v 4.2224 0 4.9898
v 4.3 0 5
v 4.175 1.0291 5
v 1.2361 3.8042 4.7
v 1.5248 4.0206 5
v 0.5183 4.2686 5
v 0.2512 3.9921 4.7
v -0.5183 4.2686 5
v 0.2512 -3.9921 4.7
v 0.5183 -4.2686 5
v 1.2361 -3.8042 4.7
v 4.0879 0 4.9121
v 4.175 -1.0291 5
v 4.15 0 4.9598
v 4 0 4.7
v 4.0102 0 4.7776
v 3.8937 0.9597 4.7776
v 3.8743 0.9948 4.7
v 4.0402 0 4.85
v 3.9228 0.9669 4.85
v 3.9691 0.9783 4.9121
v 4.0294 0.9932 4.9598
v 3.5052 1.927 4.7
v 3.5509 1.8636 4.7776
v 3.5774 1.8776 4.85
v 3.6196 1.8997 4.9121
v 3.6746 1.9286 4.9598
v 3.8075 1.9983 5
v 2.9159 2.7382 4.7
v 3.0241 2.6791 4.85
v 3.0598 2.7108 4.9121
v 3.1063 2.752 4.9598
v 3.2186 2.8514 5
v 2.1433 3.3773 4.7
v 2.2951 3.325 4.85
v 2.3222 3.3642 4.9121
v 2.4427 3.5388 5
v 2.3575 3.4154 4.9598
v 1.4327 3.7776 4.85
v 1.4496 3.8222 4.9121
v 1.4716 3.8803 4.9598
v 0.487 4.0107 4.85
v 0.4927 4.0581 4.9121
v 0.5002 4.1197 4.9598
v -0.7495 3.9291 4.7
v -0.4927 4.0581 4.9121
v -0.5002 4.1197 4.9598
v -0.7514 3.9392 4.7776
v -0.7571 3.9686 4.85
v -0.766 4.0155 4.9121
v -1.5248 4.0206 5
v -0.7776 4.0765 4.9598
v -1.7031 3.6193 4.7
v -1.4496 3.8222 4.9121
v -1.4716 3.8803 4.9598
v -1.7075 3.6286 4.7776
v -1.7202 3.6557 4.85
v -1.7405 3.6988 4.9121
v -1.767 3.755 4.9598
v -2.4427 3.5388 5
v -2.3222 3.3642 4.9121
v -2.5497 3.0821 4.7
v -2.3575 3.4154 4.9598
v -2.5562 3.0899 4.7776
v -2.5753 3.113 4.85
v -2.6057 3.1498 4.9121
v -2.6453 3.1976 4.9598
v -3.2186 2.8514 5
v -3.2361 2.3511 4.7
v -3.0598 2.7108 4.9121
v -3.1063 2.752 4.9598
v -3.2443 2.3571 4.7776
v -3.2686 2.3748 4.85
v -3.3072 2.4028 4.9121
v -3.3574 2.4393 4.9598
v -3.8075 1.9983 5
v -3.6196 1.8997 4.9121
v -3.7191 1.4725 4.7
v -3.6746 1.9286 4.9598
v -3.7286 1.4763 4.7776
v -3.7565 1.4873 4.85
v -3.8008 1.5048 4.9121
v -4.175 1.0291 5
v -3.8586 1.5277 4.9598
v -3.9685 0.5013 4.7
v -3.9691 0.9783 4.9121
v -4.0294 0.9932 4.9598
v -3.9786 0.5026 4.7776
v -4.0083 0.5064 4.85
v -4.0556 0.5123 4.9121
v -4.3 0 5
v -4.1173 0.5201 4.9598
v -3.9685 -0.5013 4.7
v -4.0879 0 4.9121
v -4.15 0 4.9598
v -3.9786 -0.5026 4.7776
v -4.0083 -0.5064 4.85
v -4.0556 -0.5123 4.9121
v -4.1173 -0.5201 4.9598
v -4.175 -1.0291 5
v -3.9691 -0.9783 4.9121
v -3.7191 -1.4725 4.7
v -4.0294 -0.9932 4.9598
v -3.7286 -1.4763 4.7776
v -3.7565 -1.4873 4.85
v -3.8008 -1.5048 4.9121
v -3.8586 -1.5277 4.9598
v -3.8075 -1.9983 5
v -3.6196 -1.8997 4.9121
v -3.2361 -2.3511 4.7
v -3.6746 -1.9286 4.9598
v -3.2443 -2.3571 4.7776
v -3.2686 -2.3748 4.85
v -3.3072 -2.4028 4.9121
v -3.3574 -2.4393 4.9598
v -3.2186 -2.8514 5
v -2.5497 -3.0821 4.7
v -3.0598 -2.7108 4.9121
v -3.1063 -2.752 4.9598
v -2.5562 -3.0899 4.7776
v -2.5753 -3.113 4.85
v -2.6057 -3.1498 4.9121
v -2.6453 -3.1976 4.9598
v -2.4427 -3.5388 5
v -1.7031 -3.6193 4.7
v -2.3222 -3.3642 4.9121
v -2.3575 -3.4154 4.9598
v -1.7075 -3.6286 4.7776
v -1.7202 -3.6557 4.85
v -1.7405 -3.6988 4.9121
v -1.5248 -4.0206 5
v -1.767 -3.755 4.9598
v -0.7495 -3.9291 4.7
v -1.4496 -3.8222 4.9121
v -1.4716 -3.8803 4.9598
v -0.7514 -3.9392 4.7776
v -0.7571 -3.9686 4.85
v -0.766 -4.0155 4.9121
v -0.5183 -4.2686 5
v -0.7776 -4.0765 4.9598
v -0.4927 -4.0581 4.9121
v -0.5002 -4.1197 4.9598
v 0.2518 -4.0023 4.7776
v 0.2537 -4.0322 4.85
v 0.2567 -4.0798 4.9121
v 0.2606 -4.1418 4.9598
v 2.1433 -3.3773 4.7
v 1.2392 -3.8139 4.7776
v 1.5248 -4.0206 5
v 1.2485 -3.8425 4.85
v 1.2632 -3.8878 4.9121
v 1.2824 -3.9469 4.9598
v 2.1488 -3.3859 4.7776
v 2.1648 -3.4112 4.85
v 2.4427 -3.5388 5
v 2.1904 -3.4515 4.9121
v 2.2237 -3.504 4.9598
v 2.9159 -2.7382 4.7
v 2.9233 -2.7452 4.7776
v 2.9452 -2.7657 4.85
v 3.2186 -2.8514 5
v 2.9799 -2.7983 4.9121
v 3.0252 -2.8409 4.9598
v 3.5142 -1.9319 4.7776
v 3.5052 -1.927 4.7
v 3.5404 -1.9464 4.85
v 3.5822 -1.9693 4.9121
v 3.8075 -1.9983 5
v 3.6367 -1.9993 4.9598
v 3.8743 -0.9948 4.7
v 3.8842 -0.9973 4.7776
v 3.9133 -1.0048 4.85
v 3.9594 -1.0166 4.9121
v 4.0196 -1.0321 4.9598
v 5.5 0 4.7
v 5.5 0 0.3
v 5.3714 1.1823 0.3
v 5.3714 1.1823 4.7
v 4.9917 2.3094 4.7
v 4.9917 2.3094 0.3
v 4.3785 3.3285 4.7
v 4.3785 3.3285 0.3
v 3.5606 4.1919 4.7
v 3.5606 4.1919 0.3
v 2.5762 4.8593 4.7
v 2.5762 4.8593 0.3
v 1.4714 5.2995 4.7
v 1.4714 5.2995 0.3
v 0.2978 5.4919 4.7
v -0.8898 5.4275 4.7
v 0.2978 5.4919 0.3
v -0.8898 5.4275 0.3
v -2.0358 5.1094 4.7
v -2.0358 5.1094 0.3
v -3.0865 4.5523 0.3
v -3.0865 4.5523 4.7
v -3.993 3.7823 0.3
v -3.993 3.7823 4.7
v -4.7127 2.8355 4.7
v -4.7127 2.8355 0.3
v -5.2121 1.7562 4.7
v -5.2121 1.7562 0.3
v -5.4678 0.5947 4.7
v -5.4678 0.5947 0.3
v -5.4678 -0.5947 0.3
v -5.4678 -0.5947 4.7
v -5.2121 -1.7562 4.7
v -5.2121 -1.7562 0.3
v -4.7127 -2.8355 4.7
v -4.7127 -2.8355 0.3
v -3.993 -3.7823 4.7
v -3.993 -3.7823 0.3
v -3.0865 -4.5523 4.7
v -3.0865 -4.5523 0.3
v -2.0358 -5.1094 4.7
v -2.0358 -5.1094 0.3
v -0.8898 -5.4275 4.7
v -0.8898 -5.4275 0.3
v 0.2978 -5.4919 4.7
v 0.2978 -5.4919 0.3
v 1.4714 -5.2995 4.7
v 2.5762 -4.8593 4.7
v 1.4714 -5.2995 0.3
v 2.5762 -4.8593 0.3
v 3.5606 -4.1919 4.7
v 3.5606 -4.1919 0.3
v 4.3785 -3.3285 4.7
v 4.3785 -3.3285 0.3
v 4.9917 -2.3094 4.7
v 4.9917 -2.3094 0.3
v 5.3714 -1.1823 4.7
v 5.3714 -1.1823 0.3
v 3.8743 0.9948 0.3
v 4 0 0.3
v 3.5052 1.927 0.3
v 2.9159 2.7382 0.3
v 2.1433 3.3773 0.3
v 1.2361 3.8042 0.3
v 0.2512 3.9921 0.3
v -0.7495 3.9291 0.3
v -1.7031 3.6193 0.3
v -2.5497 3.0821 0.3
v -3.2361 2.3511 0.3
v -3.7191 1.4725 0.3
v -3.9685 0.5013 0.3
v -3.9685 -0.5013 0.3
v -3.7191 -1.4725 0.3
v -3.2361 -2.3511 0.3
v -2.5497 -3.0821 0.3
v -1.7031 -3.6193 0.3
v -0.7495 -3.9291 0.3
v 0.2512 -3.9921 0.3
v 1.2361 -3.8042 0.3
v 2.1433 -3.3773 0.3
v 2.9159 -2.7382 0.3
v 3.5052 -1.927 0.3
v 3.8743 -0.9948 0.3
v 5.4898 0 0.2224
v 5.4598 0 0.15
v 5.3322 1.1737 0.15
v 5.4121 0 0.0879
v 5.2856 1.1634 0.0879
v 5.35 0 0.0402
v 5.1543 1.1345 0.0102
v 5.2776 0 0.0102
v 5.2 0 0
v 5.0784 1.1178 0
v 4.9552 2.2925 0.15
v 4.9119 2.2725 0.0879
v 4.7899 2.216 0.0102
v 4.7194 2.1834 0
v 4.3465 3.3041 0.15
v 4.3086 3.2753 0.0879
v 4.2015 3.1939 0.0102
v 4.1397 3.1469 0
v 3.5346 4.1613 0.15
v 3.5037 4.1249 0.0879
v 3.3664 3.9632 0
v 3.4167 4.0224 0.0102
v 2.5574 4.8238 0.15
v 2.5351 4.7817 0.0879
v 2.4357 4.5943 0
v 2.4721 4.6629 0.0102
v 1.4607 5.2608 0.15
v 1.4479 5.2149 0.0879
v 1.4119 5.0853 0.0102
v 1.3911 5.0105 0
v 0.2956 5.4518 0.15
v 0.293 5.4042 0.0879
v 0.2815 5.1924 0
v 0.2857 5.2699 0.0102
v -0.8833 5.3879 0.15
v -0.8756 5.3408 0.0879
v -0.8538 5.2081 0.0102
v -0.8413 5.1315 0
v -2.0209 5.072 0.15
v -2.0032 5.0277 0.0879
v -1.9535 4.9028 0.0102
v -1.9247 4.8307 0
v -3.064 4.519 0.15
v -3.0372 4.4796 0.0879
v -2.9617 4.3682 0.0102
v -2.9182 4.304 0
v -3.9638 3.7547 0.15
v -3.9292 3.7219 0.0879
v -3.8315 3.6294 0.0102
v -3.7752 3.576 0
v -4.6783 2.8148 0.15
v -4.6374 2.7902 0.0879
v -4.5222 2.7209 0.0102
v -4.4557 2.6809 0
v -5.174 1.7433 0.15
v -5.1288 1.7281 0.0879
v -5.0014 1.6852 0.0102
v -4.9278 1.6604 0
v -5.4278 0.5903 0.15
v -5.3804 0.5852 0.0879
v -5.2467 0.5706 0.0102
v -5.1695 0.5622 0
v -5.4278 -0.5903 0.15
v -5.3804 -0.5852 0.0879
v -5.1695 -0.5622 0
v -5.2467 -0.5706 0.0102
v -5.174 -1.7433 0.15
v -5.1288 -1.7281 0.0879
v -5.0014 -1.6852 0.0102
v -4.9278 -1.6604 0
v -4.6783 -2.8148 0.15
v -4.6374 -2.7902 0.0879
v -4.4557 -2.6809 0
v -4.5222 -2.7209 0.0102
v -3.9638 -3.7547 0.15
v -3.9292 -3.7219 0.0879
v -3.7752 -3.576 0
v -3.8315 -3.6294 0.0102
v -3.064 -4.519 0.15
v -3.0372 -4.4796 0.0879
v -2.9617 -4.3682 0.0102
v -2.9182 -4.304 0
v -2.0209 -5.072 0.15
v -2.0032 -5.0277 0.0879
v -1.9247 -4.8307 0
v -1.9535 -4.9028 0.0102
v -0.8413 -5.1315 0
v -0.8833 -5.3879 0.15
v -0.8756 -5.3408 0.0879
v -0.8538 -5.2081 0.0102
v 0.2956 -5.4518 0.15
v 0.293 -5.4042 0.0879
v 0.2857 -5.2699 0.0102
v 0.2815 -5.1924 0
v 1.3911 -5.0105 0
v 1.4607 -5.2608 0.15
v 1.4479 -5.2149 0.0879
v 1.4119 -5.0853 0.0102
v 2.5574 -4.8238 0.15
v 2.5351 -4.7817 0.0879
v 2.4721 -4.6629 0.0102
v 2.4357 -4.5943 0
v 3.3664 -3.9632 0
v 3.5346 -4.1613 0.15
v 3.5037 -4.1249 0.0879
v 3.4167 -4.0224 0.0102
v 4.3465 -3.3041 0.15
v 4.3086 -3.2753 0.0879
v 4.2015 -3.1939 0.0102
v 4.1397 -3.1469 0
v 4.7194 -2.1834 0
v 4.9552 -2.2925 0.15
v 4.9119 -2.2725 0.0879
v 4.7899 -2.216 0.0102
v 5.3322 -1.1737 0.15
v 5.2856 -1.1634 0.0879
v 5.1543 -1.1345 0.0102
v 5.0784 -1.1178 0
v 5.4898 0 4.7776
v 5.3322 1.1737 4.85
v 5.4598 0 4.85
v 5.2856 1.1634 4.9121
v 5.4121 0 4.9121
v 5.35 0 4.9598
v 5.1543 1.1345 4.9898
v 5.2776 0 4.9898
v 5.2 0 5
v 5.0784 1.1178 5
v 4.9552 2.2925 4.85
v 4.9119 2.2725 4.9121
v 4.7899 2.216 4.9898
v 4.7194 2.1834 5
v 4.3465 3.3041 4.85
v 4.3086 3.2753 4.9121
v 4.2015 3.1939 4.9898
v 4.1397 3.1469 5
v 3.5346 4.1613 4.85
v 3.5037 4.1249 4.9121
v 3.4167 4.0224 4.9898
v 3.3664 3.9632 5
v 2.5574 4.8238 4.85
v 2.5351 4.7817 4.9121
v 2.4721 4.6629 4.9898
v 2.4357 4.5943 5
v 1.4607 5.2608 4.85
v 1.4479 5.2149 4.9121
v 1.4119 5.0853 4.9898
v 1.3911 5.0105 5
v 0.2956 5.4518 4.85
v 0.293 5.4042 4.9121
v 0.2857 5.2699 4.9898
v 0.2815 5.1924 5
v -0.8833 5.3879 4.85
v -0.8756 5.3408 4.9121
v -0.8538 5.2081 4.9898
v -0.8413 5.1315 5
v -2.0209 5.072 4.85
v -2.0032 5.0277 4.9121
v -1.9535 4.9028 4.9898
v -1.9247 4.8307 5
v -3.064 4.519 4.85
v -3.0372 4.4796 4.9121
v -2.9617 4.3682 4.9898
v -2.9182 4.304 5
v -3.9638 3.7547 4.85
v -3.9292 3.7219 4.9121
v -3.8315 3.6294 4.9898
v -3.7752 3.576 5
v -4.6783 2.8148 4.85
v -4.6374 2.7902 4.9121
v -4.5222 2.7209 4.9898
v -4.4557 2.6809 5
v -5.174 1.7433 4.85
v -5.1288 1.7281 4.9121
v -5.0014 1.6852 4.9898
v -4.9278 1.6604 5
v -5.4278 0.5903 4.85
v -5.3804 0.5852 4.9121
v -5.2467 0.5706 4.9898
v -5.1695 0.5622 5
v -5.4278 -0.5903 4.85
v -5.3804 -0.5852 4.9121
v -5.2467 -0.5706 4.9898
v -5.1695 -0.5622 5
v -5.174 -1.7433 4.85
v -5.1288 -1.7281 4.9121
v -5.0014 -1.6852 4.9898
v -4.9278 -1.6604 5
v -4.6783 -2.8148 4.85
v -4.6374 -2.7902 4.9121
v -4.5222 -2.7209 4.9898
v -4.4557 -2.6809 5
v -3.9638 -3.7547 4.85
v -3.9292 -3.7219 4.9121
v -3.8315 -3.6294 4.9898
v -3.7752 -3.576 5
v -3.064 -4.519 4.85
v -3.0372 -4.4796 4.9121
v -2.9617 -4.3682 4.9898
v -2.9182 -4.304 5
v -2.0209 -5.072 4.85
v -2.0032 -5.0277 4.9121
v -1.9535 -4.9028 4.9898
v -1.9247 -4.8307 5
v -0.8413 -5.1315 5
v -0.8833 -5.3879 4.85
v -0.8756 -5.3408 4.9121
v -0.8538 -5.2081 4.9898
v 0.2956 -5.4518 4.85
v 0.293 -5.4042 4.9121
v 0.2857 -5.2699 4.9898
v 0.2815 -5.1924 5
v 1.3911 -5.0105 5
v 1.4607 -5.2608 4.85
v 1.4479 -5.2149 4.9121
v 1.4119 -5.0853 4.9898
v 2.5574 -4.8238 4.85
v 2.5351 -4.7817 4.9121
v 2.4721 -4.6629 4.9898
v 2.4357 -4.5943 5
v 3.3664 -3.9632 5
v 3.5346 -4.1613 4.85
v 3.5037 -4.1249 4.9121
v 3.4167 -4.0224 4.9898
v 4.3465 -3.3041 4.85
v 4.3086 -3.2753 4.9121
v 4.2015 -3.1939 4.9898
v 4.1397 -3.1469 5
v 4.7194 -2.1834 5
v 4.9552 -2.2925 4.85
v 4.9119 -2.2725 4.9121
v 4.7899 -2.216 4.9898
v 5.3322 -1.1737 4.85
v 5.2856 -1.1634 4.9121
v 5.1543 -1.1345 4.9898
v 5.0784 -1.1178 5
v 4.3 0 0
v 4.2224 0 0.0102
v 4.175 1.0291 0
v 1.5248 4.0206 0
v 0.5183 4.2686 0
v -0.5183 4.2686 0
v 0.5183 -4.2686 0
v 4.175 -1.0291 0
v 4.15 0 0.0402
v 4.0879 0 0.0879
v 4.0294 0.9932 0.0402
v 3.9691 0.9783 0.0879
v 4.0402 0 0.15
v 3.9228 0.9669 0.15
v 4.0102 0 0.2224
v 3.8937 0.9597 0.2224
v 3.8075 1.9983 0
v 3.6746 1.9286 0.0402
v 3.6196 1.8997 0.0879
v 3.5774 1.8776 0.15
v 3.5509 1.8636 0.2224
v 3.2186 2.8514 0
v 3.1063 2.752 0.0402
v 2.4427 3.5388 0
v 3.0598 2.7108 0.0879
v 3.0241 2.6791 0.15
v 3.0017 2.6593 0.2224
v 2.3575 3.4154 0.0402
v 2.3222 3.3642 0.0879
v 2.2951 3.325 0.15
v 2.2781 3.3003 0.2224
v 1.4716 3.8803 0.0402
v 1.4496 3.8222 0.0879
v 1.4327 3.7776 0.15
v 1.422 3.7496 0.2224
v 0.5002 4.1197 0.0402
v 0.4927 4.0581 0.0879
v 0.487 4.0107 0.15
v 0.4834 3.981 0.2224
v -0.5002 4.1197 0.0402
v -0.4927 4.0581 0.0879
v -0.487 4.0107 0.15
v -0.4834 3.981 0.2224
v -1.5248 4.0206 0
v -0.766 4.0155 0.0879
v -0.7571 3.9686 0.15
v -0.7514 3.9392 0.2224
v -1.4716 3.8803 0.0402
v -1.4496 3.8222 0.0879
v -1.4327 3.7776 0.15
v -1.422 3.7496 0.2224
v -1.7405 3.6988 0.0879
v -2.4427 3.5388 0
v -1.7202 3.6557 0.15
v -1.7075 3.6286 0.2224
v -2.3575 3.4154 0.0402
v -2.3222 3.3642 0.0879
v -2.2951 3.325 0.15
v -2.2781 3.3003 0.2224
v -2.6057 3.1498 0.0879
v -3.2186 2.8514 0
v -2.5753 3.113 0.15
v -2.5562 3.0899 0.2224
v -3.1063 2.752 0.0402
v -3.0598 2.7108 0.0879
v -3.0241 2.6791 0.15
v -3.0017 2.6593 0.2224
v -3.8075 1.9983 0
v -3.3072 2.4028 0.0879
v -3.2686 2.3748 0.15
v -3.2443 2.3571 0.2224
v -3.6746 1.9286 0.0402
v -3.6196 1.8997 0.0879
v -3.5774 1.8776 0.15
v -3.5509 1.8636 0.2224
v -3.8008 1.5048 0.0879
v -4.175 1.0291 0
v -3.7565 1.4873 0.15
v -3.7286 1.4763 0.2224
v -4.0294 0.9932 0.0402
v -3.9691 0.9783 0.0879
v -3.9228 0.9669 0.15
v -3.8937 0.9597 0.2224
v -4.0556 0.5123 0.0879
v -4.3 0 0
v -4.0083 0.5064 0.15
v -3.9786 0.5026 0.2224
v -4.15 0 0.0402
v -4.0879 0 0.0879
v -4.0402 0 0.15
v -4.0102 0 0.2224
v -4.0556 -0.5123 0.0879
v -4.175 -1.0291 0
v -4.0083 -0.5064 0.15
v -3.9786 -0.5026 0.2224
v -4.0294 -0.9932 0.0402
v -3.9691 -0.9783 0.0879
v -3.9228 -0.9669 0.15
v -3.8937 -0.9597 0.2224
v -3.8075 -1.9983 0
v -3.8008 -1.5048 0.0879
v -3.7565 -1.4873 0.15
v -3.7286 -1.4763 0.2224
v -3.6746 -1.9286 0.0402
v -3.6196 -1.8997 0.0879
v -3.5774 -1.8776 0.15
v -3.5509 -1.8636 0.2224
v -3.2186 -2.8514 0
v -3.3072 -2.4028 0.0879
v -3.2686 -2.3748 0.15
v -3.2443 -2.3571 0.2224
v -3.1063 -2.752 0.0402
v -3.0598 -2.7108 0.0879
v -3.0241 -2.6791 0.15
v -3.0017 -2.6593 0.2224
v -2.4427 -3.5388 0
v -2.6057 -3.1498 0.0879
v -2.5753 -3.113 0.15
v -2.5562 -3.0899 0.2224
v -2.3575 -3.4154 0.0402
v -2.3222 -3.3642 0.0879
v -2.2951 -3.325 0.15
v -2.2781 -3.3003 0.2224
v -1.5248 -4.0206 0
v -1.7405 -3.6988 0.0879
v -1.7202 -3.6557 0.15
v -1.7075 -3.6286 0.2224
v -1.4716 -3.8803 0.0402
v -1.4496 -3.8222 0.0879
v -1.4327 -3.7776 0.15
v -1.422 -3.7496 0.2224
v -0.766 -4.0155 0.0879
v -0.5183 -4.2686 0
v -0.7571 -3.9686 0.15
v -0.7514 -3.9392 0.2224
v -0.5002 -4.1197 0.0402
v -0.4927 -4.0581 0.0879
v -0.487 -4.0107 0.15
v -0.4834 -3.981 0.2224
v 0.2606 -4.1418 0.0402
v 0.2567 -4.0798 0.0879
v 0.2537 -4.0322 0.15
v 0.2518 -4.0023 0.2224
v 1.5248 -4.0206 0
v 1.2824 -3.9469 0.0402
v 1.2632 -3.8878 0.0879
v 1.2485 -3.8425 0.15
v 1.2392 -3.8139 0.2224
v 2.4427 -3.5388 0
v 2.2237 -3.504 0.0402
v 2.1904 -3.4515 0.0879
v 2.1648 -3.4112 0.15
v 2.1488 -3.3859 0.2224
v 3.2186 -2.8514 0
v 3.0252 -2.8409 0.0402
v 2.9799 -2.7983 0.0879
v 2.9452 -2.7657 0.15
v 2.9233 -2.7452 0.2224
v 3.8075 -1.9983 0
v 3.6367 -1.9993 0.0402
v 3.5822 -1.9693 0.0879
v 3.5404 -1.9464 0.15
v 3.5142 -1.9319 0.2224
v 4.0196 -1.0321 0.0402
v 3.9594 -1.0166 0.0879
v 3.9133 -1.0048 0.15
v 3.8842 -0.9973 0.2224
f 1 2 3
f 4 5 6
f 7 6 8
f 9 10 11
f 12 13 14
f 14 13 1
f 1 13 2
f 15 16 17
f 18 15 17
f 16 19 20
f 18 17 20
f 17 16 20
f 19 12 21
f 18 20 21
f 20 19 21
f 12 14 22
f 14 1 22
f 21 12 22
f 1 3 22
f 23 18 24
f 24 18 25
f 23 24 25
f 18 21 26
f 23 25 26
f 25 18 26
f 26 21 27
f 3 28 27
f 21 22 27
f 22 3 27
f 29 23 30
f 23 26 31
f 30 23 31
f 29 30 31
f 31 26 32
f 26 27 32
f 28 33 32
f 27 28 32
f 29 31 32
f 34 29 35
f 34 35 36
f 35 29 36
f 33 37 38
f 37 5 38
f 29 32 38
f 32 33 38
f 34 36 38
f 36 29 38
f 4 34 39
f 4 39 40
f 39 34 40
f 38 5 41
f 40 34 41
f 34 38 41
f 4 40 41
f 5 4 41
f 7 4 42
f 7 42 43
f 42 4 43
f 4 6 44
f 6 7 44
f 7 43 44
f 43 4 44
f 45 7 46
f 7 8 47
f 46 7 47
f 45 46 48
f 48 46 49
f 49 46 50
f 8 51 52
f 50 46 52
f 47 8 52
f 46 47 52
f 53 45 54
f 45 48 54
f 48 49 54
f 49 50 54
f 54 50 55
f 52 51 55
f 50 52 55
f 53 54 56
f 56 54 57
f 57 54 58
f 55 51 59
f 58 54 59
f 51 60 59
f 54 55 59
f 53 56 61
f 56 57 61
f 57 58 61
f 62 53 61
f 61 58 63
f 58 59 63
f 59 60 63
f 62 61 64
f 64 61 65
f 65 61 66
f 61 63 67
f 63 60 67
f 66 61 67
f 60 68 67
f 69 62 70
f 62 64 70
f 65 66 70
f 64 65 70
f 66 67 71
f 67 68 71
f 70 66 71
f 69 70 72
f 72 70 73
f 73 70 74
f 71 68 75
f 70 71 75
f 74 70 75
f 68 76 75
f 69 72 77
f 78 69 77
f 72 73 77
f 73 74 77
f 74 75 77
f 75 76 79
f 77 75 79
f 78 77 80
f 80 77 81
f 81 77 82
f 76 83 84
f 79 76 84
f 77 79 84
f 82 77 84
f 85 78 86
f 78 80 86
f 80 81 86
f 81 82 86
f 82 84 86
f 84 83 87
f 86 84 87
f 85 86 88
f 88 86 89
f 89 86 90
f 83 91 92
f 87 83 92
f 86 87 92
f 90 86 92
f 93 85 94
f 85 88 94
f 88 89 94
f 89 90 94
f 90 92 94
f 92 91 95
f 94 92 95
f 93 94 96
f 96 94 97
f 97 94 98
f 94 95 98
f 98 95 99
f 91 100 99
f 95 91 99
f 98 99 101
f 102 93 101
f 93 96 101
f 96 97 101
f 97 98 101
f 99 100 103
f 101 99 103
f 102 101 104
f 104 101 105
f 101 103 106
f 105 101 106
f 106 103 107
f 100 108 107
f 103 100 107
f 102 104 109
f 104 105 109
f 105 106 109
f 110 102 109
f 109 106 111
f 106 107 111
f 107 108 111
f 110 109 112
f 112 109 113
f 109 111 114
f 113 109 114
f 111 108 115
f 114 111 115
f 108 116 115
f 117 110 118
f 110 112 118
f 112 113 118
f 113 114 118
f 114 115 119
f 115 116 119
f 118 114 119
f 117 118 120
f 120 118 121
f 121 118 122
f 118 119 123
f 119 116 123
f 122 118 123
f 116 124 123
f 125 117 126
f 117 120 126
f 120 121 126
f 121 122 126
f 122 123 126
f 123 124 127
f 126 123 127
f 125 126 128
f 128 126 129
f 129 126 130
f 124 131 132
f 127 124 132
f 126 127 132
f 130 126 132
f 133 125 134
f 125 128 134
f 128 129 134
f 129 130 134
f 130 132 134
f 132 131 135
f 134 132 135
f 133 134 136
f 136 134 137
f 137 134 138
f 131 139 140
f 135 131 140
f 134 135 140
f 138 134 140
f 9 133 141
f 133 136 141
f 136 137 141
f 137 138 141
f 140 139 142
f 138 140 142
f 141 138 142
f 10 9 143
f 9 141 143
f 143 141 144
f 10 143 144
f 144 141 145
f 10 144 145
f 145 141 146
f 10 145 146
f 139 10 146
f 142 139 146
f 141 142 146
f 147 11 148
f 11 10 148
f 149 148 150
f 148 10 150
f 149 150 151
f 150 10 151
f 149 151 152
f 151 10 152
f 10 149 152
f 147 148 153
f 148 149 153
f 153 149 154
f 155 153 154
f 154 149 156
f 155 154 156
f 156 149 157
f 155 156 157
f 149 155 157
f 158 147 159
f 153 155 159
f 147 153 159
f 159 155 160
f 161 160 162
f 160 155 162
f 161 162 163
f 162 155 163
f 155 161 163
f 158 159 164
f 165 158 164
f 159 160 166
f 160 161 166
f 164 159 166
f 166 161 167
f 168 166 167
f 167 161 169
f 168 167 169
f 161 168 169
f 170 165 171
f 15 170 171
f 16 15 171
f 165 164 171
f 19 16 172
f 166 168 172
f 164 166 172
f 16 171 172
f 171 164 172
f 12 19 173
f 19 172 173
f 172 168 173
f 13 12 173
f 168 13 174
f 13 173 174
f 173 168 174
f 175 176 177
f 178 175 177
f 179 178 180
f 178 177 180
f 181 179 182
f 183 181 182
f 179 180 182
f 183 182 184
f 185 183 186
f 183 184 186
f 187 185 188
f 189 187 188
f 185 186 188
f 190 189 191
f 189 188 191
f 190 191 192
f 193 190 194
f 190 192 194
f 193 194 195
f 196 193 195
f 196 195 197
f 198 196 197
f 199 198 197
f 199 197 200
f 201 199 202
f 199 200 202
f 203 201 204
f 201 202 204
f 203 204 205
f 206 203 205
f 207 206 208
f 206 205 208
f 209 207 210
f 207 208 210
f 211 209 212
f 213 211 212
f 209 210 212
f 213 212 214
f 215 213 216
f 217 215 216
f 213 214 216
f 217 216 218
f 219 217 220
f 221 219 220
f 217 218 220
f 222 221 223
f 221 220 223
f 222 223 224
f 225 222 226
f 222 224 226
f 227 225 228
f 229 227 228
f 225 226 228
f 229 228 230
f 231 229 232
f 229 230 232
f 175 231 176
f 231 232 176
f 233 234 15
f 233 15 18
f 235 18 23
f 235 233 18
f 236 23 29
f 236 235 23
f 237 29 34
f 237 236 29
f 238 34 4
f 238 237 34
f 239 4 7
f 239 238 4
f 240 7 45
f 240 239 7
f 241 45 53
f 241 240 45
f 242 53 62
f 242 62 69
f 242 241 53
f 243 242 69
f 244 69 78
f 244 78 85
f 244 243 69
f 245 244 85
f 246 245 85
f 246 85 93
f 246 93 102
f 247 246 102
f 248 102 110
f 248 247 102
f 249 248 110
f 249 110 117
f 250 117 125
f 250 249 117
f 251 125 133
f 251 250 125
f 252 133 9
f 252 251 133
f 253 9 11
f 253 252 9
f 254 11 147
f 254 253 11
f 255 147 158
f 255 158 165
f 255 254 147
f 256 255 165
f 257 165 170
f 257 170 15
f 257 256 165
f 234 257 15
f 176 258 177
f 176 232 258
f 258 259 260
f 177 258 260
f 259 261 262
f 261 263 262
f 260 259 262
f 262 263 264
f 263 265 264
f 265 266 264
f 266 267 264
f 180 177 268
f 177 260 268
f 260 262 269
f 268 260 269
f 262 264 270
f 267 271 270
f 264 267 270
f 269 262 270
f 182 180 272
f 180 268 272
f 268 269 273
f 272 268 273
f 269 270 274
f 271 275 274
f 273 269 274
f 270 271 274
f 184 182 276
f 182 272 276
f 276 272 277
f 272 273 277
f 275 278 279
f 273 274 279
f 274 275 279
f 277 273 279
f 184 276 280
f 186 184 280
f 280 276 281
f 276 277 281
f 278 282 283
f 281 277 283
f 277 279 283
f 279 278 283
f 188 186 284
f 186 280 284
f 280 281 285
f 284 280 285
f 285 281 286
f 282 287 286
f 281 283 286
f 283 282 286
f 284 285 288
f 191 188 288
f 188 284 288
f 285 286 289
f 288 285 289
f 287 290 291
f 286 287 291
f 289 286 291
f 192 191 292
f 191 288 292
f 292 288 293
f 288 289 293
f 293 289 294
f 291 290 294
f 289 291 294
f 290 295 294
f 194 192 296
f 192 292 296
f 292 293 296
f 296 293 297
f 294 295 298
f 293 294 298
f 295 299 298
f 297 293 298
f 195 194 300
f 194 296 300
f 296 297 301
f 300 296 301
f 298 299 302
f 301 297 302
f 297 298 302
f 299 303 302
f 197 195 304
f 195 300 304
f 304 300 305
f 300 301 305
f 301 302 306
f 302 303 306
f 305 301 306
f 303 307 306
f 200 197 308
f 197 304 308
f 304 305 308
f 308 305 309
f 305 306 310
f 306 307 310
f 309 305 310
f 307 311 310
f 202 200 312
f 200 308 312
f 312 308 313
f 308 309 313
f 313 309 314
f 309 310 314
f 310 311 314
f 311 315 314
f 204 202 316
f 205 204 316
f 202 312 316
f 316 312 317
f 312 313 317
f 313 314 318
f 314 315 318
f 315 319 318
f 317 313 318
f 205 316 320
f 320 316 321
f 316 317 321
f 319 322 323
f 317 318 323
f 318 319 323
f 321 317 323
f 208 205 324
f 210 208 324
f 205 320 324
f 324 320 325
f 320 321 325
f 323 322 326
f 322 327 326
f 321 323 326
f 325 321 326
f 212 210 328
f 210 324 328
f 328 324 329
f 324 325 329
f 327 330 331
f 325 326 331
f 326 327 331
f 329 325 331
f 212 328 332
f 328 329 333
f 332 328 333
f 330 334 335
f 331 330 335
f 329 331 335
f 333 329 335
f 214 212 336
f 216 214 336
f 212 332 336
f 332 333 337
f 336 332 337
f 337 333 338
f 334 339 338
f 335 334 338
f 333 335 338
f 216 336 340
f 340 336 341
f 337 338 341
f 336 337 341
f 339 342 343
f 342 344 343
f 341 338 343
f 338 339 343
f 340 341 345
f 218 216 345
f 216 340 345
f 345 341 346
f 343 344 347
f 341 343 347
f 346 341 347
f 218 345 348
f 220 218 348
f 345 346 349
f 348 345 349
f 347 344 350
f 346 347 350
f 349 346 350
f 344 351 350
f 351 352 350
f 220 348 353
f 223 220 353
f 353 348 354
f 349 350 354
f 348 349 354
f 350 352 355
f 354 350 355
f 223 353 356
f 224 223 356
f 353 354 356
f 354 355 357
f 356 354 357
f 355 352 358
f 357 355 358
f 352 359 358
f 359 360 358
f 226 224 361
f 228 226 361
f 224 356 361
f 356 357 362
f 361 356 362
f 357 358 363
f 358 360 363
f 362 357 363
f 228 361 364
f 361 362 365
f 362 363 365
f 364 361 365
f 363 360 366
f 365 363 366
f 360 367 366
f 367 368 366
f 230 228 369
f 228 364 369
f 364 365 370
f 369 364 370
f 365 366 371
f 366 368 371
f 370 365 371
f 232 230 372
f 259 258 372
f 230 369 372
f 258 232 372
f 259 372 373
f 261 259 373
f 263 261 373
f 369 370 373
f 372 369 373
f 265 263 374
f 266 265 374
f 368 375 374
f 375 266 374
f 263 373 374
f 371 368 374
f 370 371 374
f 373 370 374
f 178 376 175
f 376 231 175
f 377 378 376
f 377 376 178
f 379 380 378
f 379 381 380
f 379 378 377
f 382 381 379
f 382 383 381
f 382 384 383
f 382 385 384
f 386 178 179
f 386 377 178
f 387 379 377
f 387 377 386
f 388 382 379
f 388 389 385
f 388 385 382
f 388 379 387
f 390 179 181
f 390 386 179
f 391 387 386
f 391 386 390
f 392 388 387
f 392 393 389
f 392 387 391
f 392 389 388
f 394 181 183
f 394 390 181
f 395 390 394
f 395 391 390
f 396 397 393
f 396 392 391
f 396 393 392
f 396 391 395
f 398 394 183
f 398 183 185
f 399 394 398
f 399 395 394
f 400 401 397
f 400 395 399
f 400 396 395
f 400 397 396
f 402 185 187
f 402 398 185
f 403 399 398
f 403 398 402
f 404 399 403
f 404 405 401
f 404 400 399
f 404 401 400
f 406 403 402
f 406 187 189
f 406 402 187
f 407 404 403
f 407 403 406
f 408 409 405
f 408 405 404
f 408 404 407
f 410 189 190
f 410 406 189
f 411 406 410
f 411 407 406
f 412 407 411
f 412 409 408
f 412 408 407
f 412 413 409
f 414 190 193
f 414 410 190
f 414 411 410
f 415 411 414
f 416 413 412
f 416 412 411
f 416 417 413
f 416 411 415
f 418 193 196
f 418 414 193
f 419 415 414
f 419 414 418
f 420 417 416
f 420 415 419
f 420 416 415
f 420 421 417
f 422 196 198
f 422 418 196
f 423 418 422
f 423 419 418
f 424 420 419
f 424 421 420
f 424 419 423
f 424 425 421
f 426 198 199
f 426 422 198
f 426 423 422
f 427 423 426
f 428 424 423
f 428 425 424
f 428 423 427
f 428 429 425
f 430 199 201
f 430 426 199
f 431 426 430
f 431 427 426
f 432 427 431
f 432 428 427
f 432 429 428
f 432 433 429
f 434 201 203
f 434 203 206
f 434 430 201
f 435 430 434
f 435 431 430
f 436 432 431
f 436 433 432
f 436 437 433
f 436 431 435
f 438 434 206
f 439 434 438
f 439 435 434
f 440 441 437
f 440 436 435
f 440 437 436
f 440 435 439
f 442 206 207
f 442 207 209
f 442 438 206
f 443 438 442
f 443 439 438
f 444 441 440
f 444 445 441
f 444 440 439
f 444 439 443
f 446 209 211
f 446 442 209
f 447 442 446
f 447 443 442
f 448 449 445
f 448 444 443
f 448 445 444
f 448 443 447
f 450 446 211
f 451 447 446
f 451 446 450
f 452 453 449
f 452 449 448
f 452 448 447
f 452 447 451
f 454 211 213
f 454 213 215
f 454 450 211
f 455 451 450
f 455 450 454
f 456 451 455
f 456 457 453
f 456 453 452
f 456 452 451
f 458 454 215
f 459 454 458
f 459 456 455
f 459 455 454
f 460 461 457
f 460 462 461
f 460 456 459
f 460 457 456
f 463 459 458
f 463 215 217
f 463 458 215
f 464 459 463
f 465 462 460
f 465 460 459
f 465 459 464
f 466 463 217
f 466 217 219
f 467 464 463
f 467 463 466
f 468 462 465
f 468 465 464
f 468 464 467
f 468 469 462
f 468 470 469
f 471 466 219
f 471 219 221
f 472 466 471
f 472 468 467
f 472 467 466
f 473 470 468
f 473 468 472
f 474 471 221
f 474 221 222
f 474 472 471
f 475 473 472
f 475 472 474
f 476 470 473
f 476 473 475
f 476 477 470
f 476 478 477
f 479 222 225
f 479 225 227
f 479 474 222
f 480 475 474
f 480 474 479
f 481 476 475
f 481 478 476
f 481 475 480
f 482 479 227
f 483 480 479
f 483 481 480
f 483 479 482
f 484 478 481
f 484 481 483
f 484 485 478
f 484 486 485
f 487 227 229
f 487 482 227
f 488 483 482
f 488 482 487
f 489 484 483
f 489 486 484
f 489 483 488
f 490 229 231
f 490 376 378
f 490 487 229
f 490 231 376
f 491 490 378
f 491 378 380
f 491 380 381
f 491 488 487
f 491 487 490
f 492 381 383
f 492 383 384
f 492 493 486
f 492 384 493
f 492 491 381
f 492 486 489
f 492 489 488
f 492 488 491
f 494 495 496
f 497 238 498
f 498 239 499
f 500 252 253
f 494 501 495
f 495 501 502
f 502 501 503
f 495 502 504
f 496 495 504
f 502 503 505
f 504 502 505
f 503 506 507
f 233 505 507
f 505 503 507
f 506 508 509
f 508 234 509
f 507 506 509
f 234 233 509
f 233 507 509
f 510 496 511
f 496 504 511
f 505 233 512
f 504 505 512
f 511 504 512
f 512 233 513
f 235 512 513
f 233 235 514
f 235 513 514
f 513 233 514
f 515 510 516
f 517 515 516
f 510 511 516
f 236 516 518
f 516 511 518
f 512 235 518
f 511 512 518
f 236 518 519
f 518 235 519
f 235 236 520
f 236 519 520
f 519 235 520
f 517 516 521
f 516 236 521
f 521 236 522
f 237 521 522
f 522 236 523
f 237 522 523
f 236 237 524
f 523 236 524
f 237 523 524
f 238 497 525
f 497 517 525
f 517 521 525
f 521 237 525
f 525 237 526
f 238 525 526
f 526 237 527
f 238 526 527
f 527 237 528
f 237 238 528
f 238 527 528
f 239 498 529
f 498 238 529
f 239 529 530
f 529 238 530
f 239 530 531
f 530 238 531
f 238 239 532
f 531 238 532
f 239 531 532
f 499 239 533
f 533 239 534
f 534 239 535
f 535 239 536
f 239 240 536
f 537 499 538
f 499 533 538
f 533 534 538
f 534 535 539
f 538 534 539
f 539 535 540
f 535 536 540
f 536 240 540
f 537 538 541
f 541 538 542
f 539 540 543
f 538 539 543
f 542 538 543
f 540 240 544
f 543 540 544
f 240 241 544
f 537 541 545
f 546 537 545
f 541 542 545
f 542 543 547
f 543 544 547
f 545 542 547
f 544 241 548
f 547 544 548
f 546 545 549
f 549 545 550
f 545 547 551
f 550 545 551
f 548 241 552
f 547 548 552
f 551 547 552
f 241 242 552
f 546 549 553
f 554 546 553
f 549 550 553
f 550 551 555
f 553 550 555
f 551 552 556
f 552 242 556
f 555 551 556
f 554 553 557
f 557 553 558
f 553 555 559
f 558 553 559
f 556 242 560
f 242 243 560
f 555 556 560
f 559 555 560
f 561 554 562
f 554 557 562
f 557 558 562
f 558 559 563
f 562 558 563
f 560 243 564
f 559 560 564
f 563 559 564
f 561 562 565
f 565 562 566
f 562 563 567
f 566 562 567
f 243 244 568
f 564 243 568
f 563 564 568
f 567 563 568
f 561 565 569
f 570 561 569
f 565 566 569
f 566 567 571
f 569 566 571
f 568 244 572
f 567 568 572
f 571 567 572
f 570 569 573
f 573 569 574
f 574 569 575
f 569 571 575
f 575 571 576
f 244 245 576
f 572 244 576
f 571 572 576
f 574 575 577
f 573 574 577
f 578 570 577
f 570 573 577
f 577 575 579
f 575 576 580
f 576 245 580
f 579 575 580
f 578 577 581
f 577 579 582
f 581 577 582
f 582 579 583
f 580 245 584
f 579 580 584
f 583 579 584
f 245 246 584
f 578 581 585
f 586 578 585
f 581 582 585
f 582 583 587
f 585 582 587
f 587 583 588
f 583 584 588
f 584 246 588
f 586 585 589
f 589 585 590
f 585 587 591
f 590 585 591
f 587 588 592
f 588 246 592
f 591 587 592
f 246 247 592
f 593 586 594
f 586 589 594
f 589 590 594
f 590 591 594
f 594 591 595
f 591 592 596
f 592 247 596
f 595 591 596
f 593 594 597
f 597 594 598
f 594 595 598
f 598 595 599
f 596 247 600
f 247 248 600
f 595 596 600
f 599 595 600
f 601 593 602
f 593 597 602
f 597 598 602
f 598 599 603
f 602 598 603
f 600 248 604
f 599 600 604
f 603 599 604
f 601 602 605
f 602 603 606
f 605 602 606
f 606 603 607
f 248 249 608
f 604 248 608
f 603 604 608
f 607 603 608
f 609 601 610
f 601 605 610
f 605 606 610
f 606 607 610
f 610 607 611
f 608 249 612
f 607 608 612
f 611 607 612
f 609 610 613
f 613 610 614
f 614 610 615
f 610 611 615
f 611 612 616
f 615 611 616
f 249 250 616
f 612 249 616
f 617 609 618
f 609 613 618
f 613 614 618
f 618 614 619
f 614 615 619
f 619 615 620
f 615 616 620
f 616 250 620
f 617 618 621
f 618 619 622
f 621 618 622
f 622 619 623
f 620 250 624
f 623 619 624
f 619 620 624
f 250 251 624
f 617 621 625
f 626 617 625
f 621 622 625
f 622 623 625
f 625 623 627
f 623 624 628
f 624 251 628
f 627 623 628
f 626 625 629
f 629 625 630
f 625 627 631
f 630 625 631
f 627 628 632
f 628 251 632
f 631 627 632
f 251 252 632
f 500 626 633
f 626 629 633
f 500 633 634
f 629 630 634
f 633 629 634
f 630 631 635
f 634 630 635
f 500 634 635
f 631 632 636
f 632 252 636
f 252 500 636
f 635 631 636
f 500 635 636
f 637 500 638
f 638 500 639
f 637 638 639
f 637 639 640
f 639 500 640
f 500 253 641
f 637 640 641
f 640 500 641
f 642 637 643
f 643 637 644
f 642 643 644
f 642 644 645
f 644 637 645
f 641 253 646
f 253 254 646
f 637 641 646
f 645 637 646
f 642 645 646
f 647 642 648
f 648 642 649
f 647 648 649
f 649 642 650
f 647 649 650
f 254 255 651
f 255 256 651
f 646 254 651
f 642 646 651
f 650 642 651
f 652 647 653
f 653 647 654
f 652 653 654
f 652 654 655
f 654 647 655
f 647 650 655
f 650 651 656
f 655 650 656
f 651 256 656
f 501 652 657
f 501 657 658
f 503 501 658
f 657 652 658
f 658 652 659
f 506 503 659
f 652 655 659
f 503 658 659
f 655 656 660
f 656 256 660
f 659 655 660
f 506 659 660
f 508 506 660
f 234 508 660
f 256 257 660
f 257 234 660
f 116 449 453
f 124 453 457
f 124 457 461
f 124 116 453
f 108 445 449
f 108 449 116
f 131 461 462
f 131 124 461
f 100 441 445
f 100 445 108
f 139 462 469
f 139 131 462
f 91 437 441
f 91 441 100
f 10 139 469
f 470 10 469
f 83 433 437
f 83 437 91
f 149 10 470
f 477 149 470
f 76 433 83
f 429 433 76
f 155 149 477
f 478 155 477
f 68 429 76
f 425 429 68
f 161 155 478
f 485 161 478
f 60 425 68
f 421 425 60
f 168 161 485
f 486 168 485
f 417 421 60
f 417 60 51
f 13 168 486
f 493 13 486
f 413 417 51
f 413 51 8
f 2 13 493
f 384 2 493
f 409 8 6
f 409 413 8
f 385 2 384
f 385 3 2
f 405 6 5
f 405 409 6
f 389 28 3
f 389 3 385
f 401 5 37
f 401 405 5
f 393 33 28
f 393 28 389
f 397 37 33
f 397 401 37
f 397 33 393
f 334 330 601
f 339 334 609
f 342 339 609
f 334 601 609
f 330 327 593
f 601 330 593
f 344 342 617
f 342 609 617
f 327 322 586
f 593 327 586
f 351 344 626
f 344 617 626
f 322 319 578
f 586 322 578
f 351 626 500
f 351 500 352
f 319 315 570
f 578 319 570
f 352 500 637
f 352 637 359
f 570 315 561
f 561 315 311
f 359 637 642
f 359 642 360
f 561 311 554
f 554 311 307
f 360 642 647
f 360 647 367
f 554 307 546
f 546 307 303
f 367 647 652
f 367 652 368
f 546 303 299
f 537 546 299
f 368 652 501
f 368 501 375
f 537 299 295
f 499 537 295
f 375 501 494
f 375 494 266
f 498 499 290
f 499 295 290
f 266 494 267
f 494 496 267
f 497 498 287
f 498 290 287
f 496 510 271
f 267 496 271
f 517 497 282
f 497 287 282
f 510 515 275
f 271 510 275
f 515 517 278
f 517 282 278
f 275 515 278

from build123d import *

# Parameters (mm, degrees)
SKETCH1_R           = 5.5
SKETCH1_R_2         = 4
BOSS_EXTRUDE1_DEPTH = 5
FILLET1_R           = 0.3
FILLET2_R           = 0.3
FILLET3_R           = 0.3


with BuildPart() as part:
    # Sketch1 → Boss-Extrude1 (new body)
    with BuildSketch(Plane.XY):
        Circle(SKETCH1_R)
        Circle(SKETCH1_R_2, mode=Mode.SUBTRACT)
    extrude(amount=BOSS_EXTRUDE1_DEPTH)

    # Fillet1
    fillet1_edges = [part.edges().sort_by_distance(p)[0] for p in [
        (-5.5, 0, 0),
    ]]
    fillet(fillet1_edges, radius=FILLET1_R)

    # Fillet2
    fillet2_edges = [part.edges().sort_by_distance(p)[0] for p in [
        (-4, 0, 0),
    ]]
    fillet(fillet2_edges, radius=FILLET2_R)

    # Fillet3
    fillet3_edges = [part.edges().sort_by_distance(p)[0] for p in [
        (-5.5, 0, 5),
        (-4, 0, 5),
    ]]
    fillet(fillet3_edges, radius=FILLET3_R)


solid = part.part
